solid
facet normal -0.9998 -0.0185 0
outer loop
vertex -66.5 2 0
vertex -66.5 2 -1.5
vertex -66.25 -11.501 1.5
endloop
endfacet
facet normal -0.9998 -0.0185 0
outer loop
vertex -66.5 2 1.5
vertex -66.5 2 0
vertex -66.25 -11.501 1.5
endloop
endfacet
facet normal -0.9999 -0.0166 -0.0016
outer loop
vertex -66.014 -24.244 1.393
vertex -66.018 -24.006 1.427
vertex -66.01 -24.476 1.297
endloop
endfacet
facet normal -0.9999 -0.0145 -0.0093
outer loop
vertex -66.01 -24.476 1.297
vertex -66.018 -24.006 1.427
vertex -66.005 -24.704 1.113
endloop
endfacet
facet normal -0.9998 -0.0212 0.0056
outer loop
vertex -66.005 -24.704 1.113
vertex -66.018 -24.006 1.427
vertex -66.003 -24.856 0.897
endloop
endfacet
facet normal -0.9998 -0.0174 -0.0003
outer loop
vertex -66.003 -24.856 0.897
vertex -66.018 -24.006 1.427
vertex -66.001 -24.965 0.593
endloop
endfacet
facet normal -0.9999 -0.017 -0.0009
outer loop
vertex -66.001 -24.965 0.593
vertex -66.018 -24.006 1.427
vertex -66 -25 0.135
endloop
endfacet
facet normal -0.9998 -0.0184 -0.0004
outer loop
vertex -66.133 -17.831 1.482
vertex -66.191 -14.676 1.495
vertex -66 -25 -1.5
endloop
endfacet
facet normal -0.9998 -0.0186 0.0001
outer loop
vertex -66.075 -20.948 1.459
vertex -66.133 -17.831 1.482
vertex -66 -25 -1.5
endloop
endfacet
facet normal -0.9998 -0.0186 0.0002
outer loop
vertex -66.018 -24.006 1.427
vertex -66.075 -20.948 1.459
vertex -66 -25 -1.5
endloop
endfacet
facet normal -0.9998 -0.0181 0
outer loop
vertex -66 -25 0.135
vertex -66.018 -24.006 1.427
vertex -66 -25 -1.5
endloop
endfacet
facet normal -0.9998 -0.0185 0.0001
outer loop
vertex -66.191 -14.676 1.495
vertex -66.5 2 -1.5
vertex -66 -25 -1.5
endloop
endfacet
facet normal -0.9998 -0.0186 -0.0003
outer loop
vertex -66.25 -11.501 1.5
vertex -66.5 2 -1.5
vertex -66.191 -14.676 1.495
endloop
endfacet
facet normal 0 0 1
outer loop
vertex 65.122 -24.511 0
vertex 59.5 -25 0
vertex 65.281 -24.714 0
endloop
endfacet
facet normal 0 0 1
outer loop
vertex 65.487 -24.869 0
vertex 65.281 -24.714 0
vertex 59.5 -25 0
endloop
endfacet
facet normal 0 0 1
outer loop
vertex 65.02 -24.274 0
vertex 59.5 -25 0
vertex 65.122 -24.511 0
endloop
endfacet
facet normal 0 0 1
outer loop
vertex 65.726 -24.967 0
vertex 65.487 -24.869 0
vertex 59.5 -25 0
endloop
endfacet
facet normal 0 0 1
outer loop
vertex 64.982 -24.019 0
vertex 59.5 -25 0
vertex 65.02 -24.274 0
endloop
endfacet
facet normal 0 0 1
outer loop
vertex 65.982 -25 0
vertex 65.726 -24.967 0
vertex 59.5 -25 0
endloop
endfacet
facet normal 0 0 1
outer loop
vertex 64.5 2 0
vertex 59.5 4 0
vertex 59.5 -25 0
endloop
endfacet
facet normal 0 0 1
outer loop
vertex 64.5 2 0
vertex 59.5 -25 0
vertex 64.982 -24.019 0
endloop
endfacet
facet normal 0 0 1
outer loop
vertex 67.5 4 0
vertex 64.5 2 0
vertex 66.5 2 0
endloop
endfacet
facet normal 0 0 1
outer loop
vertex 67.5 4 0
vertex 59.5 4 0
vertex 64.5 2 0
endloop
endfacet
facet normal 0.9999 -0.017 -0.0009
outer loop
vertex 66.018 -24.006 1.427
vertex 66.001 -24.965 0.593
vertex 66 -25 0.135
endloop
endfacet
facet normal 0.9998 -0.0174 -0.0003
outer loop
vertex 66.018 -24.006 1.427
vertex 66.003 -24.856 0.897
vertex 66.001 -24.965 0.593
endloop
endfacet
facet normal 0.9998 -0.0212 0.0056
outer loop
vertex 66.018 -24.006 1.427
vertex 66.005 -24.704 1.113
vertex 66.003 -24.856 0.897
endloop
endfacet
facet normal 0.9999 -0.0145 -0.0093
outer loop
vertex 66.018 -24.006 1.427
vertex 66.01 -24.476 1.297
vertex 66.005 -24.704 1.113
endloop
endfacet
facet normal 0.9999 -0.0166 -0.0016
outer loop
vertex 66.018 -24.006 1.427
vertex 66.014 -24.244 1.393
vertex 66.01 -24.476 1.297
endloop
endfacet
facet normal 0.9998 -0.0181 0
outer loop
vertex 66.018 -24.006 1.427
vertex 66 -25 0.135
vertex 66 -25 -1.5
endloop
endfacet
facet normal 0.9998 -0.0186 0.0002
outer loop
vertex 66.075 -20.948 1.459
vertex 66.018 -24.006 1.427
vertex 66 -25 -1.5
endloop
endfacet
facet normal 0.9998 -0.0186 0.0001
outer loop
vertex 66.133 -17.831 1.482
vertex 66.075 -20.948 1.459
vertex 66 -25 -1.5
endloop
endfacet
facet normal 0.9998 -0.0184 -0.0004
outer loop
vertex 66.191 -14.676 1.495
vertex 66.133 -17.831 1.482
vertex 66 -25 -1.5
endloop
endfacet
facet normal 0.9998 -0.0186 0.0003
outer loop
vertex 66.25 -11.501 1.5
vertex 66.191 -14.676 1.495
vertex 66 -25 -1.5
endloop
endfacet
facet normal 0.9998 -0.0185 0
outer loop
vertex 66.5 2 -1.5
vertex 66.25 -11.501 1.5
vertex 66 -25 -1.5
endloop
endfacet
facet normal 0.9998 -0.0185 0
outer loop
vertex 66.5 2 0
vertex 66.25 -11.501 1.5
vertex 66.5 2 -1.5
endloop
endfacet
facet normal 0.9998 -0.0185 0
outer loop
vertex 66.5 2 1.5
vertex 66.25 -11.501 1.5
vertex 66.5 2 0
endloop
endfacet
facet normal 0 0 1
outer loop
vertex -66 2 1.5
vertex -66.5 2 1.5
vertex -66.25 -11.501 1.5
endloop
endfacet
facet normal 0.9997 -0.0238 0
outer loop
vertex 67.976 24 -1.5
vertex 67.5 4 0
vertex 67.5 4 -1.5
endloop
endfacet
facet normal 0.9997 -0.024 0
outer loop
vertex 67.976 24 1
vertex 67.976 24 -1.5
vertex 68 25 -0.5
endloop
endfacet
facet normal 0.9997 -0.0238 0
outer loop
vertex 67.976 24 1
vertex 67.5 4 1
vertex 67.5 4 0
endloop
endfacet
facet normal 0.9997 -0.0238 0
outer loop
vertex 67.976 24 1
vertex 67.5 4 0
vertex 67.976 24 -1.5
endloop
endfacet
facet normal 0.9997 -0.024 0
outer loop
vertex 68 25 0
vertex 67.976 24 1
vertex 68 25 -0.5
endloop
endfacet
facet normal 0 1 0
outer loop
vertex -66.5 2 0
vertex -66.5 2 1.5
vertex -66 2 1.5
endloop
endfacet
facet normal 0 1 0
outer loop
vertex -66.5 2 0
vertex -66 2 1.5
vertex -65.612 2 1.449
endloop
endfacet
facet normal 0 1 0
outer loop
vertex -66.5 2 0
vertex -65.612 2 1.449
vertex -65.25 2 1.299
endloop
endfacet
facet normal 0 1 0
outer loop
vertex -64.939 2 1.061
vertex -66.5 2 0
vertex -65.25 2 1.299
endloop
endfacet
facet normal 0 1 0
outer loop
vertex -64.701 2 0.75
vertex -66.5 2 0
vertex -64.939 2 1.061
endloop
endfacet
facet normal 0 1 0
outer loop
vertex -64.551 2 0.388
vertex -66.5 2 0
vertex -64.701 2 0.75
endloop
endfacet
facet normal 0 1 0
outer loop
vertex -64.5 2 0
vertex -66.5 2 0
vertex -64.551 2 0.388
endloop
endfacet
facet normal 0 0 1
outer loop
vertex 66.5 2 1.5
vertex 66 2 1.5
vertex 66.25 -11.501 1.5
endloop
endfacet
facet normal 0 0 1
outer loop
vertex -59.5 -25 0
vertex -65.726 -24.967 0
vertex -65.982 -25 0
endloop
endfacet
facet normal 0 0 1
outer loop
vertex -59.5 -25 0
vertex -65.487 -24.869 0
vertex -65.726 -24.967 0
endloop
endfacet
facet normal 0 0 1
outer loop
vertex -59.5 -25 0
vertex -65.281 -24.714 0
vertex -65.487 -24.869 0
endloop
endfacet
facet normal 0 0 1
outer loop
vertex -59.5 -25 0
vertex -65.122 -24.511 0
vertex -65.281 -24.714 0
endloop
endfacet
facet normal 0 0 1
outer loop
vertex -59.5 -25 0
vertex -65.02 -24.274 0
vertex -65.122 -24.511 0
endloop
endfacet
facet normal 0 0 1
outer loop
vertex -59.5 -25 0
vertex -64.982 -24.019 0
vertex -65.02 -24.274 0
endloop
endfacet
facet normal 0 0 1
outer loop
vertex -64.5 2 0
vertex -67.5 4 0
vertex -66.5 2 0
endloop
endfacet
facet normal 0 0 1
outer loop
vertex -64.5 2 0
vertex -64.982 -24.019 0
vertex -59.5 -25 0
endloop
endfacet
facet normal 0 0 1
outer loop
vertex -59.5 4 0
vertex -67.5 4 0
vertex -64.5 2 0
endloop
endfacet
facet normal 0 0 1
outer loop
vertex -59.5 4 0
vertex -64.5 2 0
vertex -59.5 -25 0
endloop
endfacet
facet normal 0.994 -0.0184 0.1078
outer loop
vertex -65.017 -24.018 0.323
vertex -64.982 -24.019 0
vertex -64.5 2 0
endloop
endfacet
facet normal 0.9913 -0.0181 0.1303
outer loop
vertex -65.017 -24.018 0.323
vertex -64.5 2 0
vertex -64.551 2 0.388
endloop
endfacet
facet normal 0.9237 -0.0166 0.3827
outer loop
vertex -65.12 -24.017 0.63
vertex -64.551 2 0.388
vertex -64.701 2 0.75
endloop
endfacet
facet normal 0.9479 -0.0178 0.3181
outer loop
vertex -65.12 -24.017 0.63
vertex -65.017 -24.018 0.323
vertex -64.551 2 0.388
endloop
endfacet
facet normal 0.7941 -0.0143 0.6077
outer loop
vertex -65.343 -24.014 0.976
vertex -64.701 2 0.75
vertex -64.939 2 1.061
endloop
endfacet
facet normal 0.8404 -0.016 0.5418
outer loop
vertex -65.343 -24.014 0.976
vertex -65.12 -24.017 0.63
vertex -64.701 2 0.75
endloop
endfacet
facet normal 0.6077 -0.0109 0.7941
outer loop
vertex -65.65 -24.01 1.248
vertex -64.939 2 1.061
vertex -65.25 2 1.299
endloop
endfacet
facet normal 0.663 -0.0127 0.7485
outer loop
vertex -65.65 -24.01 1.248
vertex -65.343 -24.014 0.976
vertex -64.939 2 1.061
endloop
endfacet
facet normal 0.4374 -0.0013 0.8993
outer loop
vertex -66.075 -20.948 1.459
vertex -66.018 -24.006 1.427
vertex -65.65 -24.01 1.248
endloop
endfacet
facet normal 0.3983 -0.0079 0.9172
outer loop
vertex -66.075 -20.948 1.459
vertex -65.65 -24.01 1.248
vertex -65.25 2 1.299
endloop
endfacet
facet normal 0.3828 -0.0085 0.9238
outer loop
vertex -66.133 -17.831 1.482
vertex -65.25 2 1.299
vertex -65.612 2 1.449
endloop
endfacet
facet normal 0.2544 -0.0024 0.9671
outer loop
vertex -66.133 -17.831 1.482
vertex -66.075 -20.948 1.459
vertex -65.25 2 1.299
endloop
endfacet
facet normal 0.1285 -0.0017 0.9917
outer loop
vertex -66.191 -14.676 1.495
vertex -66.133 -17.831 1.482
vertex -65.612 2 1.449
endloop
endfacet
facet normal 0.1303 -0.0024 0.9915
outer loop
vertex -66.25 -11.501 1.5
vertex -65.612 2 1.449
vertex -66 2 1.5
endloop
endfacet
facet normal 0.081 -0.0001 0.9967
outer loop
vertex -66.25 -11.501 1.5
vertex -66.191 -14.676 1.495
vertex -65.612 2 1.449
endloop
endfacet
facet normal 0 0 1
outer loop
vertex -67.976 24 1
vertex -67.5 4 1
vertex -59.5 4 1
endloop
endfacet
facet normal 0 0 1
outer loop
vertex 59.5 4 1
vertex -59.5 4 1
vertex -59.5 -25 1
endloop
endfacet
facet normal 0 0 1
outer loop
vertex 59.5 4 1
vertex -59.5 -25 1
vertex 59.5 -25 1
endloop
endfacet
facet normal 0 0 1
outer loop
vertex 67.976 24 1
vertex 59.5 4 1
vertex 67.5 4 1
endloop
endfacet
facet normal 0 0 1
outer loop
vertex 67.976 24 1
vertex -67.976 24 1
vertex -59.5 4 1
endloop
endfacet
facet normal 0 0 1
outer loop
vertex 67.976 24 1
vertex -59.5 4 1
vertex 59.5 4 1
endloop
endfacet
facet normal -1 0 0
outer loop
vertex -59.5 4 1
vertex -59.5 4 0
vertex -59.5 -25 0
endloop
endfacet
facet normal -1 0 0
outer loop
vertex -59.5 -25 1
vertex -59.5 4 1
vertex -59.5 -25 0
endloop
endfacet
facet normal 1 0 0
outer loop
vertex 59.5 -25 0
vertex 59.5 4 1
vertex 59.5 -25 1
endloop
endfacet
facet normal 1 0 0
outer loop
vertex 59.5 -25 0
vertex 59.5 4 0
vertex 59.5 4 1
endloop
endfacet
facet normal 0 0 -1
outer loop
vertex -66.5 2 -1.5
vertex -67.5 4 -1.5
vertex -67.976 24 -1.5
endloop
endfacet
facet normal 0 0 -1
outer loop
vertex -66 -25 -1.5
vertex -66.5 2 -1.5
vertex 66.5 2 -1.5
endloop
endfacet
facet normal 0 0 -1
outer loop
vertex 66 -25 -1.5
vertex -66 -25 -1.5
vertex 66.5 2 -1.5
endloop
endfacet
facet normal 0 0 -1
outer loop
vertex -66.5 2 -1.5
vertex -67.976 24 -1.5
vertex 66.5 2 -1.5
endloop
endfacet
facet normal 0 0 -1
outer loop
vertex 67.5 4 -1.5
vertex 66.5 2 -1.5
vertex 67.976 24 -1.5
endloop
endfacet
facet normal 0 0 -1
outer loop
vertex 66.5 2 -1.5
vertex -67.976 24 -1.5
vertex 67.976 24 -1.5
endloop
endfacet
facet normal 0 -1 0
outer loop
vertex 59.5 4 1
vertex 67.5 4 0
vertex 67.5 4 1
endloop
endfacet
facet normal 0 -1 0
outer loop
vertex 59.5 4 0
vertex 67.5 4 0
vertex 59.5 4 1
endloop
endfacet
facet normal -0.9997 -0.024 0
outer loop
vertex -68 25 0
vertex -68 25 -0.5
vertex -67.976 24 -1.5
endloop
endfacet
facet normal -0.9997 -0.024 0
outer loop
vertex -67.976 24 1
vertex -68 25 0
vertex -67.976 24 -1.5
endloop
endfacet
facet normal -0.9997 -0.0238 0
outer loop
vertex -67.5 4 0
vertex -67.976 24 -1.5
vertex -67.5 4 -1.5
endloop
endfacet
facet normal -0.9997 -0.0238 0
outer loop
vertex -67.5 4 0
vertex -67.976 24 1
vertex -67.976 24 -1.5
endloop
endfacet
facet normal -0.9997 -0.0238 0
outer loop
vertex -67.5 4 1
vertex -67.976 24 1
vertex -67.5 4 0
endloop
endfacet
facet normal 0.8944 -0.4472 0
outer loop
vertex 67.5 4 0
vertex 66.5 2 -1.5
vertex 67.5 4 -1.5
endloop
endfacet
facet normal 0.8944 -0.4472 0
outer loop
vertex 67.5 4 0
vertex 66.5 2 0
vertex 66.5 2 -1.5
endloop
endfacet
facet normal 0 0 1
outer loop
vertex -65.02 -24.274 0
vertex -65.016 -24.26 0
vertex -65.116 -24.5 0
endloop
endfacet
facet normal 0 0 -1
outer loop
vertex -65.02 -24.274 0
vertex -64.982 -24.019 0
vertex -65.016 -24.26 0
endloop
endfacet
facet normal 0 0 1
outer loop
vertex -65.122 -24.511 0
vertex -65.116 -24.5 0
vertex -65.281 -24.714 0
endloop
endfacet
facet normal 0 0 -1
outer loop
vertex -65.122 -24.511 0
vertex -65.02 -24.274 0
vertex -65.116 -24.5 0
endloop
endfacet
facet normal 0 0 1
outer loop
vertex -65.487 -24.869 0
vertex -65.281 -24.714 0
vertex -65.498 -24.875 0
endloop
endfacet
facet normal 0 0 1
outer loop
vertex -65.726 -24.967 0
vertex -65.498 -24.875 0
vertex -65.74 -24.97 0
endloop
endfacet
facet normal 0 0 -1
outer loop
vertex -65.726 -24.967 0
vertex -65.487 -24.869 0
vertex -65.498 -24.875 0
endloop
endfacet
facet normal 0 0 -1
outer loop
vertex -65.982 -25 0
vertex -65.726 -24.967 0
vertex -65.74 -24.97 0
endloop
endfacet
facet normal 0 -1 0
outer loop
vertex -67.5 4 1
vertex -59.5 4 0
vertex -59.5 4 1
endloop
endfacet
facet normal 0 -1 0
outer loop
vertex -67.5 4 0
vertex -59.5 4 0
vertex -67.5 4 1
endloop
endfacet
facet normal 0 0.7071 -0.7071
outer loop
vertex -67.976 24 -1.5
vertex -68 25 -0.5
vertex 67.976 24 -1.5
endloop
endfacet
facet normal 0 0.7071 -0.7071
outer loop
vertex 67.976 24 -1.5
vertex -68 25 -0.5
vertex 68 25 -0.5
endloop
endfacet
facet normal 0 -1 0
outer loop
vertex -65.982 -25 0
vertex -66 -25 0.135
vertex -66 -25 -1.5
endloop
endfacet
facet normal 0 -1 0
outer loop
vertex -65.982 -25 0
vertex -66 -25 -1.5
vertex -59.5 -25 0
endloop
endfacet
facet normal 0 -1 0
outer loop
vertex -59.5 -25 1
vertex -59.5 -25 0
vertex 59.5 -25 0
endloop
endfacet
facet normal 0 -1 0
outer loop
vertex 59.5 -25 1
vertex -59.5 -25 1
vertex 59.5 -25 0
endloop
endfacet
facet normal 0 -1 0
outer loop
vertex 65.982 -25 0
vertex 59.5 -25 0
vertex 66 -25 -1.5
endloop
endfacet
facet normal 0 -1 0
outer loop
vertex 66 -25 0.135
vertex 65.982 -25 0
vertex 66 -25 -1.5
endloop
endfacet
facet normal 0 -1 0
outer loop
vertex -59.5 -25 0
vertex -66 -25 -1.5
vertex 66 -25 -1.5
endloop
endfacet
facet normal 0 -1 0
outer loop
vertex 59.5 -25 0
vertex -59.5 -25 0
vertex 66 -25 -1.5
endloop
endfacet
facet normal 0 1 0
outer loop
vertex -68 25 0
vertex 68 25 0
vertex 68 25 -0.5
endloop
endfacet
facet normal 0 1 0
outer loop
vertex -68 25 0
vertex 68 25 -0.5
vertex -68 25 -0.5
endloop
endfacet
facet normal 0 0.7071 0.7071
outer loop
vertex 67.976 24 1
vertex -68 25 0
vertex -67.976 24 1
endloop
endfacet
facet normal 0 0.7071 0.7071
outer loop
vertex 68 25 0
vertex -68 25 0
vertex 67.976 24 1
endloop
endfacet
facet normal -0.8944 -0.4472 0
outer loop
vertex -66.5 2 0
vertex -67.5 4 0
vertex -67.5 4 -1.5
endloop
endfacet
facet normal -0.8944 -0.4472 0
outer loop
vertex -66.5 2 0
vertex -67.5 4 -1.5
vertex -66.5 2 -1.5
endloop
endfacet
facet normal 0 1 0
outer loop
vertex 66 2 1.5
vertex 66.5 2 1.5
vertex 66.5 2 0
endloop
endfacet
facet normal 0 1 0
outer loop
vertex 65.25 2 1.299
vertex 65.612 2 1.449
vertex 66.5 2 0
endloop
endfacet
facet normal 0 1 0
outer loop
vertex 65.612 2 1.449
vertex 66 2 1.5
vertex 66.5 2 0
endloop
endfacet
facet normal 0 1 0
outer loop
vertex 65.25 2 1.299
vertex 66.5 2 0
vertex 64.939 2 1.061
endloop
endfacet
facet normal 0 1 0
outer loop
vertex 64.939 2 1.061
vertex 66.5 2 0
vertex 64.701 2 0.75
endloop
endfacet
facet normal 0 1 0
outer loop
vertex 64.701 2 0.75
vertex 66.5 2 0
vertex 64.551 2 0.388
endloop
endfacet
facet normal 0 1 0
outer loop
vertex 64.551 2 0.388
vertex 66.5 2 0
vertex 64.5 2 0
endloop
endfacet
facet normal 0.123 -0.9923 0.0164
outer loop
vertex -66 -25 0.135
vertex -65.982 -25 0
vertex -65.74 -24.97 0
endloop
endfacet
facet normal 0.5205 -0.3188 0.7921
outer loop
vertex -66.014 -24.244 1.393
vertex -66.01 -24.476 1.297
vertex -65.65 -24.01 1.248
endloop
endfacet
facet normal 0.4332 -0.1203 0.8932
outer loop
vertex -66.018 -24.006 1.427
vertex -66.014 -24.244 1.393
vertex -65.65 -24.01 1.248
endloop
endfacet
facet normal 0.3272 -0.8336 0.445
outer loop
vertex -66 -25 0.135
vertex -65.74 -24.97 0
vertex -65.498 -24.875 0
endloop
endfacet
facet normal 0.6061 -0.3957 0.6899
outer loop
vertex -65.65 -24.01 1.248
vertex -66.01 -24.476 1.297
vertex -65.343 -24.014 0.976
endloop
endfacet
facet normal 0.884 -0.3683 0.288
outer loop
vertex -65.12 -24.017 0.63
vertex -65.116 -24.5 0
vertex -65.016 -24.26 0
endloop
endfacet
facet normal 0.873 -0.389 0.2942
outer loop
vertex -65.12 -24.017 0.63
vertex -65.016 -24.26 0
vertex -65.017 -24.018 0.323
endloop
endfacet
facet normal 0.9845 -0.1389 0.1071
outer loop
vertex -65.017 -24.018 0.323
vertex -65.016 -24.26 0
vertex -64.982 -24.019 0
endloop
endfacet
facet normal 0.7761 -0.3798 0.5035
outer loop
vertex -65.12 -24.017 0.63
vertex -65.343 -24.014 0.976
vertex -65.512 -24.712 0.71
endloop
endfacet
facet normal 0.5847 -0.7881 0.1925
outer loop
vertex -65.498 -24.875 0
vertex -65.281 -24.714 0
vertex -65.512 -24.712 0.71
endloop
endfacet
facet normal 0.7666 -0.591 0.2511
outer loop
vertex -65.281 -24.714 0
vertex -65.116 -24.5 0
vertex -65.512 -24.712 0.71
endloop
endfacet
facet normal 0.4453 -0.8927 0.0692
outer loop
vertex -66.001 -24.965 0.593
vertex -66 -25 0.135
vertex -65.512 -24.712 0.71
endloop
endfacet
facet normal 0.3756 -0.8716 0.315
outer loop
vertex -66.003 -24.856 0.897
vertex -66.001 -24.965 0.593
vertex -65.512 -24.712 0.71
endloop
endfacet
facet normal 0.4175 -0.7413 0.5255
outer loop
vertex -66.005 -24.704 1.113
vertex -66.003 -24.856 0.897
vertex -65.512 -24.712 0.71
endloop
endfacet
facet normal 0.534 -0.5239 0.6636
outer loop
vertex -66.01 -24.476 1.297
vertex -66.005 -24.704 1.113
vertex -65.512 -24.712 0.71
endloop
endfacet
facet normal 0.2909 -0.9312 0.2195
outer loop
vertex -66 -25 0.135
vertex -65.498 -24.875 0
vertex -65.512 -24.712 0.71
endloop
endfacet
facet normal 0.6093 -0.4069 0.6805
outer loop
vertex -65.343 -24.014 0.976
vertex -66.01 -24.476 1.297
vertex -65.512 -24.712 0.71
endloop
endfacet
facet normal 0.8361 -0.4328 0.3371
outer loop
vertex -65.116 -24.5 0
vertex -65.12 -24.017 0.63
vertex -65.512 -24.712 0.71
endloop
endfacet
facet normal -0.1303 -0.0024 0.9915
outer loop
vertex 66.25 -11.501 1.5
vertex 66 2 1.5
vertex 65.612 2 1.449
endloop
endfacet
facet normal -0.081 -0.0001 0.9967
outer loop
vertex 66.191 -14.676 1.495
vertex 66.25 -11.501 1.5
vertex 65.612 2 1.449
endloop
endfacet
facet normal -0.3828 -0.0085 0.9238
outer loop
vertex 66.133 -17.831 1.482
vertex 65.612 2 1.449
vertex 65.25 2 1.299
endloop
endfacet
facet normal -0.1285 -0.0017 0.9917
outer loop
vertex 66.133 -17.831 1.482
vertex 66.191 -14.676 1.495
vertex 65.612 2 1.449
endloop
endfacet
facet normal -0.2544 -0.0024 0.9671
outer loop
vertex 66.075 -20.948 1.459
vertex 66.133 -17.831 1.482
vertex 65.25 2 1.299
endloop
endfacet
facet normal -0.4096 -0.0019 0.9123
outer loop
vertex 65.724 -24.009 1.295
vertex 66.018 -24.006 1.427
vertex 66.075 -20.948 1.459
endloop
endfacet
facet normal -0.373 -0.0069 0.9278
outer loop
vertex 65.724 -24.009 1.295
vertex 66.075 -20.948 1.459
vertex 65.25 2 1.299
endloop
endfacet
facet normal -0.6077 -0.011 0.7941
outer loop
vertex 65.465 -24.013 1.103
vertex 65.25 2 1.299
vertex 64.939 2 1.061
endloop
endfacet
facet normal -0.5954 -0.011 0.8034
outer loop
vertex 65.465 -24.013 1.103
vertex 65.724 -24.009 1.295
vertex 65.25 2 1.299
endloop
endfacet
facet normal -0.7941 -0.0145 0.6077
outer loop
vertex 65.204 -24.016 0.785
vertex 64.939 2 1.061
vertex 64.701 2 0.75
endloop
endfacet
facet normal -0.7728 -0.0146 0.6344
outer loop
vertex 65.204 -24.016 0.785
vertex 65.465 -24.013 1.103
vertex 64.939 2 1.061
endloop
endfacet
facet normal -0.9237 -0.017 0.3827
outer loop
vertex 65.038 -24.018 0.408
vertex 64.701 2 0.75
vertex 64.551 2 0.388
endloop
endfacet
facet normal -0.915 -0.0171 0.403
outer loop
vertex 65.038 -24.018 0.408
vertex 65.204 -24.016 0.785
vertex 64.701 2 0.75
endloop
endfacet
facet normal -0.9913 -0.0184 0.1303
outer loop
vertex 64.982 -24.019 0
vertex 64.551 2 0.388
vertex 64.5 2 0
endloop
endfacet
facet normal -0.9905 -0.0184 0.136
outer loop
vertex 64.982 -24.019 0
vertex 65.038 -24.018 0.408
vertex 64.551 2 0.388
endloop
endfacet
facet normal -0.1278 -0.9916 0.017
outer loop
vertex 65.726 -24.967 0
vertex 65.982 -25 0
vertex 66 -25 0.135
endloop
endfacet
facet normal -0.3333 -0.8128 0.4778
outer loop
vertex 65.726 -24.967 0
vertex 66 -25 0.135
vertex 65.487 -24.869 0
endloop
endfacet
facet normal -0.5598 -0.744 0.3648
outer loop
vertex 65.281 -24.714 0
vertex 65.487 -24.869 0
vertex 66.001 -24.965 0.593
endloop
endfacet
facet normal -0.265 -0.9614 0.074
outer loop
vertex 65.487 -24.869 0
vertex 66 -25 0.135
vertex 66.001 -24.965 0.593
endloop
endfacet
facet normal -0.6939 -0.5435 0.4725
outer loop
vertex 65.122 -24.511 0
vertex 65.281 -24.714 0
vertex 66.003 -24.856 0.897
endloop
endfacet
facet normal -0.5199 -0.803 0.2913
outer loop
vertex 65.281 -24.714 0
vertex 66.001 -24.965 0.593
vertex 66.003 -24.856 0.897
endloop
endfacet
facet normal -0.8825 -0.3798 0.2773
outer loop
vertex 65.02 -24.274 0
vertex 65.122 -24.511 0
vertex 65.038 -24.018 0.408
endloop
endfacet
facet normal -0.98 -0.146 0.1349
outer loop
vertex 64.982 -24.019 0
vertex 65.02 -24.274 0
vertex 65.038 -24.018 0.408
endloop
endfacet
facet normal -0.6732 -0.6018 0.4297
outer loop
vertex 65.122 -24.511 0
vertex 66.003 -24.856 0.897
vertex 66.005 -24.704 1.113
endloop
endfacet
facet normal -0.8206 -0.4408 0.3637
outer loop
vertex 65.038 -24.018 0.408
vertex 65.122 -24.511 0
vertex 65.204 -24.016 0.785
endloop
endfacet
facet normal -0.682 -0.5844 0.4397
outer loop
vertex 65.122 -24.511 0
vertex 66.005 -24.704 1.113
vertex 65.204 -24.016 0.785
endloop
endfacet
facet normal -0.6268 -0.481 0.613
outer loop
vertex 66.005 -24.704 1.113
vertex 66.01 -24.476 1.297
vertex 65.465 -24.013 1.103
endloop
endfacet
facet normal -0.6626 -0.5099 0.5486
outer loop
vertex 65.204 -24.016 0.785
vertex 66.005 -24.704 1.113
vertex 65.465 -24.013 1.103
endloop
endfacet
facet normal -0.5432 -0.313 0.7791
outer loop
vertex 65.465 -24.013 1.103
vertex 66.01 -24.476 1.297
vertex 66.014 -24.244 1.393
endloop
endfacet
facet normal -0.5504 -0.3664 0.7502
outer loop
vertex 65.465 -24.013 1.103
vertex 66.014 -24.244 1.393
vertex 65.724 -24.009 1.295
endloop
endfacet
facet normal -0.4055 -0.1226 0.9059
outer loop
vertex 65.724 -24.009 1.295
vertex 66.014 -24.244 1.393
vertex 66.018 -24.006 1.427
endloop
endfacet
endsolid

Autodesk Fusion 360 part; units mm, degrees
sketch "Sketch1" plane through (0, 0, 0) normal (0, 0, 1) x (1, 0, 0)
  line L0 (-66, -25) -> (66, -25)
  line L1 (66, -25) -> (66.5, 2)
  line L2 (66.5, 2) -> (67.5, 4)
  line L3 (67.5, 4) -> (68, 25)
  line L4 (68, 25) -> (-68, 25)
  line L5 (-68, 25) -> (-67.5, 4)
  line L6 (-67.5, 4) -> (-66.5, 2)
  line L7 (-66.5, 2) -> (-66, -25)
  line L8 (0, 25) -> (0, -25) construction
  line L9 (-66.5, 2) -> (66.5, 2) construction
  line L10 (67.5, 4) -> (-67.5, 4)
  line L11 (-66.5, 2) -> (-64.5, 2)
  line L12 (-64.5, 2) -> (-65, -25)
  line L13 (66.5, 2) -> (64.5, 2)
  line L14 (64.5, 2) -> (65, -25)
  line L15 (-59.5, 25) -> (-59.5, -25)
  line L16 (59.5, 25) -> (59.5, -25)
  point P0 (0, 2)
  point P1 (0, 4)
  dimension "d1" = 132
  dimension "d2" = 133
  dimension "d3" = 27
  dimension "d4" = 29
  dimension "d5" = 50
  dimension "d6" = 136
  dimension "d7" = 135
  dimension "d8" = 1
  dimension "d9" = 2
  dimension "d10" = 1
  dimension "d11" = 2
  dimension "d22" = 8
  dimension "d23" = 8
extrude "Extrude1" add sketch "Sketch1" along normal blind 1.5 contours L0 L7 L11 L12 | L0 L1 L13 L14 makes body 1 at (-66.3333, -7, 0.5) makes body 2 at (64.6667, -7, 0.5)
extrude "Extrude3" add sketch "Sketch1" along normal blind 1 separate body contours L0 L10 L15 L16 | L4 L5 L10 L15 | L4 L10 L15 L16 | L3 L4 L10 L16 makes body 3
extrude "Extrude2" add sketch "Sketch1" against normal blind 1.5 bodies 1 3 2
fillet "Fillet1" radius 1.5 2 edges at (-64.75, -11.5, 1.5) (64.75, -11.5, 1.5) on bodies 1
chamfer "Chamfer1" distance 1 angle 45 2 edges at (0, 25, -1.5) (0, 25, 1) on bodies 1
fillet "Fillet2" radius 1 2 edges at (-65.2752, -25, 0.866) (65.2752, -25, 0.866) on bodies 1
equation "d10 = d8"
equation "d11 = d9"
equation "d23 = d22"
